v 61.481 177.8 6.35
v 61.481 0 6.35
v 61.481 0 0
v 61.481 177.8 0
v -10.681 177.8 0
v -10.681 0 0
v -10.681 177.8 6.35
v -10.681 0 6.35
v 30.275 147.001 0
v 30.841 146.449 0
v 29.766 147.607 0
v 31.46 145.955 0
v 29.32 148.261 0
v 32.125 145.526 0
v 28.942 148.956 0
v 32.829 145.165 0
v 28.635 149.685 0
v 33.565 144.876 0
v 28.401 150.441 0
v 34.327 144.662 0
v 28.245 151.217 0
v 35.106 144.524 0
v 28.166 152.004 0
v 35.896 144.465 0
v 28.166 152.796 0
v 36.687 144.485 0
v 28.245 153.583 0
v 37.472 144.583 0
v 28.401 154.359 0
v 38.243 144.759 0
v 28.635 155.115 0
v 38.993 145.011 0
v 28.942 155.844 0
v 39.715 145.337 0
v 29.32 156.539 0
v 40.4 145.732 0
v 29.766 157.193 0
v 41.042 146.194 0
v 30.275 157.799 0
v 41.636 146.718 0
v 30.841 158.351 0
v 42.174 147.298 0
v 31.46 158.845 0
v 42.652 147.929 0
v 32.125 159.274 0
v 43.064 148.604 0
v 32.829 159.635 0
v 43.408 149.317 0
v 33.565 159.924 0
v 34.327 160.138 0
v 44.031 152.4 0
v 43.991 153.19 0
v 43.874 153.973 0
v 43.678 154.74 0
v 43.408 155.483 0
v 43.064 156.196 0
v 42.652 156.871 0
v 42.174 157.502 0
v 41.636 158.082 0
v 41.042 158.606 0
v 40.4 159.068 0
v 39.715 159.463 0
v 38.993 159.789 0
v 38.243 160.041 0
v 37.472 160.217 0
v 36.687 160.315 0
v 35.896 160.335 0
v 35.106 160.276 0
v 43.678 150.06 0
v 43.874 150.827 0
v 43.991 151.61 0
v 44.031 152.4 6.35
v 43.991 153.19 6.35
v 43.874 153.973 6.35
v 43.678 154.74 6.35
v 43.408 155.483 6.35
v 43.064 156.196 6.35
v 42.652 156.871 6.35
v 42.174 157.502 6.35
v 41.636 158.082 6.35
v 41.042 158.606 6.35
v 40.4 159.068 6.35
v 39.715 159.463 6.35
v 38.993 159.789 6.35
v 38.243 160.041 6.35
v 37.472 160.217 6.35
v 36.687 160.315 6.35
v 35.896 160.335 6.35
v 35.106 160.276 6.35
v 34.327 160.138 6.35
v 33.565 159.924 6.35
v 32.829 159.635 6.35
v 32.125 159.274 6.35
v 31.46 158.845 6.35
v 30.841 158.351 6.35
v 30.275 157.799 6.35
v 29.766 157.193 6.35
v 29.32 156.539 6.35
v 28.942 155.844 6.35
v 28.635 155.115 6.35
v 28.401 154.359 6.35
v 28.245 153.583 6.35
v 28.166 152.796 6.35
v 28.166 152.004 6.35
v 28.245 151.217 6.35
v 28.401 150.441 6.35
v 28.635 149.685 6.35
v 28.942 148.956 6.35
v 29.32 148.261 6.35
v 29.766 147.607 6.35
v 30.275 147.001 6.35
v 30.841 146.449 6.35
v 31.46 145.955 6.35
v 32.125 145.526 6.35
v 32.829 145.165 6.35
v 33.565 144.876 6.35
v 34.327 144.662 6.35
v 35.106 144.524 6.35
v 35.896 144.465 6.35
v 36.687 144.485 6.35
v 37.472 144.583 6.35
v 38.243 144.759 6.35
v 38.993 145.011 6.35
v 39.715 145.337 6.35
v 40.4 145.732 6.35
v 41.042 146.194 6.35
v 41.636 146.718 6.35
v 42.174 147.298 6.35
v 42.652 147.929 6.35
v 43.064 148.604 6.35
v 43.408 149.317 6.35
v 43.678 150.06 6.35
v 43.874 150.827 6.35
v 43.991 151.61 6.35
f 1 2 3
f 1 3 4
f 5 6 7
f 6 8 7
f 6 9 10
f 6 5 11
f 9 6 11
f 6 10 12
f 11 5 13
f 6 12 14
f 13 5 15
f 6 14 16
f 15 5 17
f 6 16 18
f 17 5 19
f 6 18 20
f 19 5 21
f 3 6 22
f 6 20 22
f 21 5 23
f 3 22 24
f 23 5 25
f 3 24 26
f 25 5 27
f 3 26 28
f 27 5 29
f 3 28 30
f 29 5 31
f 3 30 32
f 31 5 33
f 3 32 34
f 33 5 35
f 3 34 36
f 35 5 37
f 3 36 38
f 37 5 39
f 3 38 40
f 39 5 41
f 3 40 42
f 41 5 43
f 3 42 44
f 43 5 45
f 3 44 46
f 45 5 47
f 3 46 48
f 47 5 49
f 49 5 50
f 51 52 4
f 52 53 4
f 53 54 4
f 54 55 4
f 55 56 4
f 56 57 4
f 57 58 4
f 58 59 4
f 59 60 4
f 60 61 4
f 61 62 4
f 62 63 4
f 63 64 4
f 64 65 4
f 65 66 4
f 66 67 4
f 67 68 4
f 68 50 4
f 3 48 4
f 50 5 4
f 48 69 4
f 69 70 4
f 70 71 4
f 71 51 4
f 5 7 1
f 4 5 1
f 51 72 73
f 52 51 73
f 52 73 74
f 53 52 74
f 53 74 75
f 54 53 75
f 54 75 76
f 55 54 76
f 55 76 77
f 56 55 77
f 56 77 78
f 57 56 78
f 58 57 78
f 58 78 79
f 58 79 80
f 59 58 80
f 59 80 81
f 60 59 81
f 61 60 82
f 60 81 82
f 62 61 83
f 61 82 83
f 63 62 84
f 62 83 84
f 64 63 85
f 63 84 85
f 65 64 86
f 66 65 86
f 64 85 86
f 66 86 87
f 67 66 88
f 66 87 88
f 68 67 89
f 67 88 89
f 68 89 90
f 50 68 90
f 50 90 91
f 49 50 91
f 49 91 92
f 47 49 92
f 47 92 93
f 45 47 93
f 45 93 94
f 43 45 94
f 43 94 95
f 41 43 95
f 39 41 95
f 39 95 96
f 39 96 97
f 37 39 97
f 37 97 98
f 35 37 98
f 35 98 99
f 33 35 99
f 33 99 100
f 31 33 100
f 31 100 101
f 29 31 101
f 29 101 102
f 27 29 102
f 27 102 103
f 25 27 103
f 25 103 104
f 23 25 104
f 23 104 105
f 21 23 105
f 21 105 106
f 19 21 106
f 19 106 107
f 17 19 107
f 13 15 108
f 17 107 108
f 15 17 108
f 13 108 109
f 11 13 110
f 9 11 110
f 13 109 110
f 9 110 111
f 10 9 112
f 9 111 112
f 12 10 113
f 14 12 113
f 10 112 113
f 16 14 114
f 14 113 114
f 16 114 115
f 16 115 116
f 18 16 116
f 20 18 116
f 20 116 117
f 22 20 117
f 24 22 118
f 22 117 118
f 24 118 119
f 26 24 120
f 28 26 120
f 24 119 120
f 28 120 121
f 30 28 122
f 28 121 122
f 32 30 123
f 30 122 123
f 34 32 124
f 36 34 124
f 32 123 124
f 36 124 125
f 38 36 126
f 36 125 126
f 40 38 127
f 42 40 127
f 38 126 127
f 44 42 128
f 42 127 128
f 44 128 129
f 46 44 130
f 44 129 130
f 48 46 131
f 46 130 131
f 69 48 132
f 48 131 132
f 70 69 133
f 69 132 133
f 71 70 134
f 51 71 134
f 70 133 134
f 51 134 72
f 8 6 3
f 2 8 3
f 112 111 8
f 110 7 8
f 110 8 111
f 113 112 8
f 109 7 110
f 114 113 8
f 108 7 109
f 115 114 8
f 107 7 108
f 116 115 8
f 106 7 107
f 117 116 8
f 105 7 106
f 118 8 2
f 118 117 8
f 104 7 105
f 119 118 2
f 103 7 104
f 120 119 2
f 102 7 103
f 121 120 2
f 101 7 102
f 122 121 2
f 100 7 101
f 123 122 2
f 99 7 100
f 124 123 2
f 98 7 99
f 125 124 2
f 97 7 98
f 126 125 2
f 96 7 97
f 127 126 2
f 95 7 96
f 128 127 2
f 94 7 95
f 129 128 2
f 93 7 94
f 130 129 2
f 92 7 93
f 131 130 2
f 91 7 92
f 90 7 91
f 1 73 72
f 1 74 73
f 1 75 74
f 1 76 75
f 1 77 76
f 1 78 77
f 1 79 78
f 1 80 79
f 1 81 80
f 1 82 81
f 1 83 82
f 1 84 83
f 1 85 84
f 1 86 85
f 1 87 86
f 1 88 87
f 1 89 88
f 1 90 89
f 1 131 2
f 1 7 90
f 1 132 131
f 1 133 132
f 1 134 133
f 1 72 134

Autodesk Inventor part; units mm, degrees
ref_plane "YZ Plane" through (0, 0, 0) normal (1, 0, 0) x (0, 1, 0)
ref_plane "XZ Plane" through (0, 0, 0) normal (0, 1, 0) x (-1, 0, 0)
ref_plane "XY Plane" through (0, 0, 0) normal (0, 0, 1) x (1, 0, 0)
sketch "Sketch1" plane through (0, 0, 0) normal (0, 0, 1) x (1, 0, 0)
  line L0 (0, 0) -> (50.8, 0)
  line L1 (50.8, 0) -> (50.8, 190.5)
  line L2 (50.8, 190.5) -> (0, 190.5)
  line L3 (0, 190.5) -> (0, 0)
  dimension "d0" = 50.8
  dimension "d1" = 190.5
extrude "Extrusion1" add sketch "Sketch1" along normal blind 6.35
sketch "Sketch2" plane through (0, 0, 6.35) normal (0, 0, 1) x (1, 0, 0)
  circle A0 centre (36.0934, 152.4) radius 7.9375
  line L0 (0, 0) -> (50.8, 0) projected
  line L1 (50.8, 0) -> (50.8, 190.5) projected
  dimension "d4" = 152.4
  dimension "d5" = 15.875
  dimension "d15" = 14.7066
extrude "Extrusion2" cut sketch "Sketch2" against normal blind 6.35
sketch "Sketch3" plane through (0, 0, 6.35) normal (0, 0, 1) x (1, 0, 0)
  line L0 (0, 190.5) -> (0, 0) projected
  line L1 (50.8, 0) -> (50.8, 190.5) projected
  line L2 (0, 177.8) -> (50.8, 177.8)
  line L3 (50.8, 177.8) -> (50.8, 190.5)
  line L4 (50.8, 190.5) -> (0, 190.5)
  line L5 (0, 190.5) -> (0, 177.8)
  dimension "d8" = 12.7
extrude "Extrusion3" cut sketch "Sketch3" against normal blind 25.4
sketch "Sketch4" plane through (0, 0, 6.35) normal (0, 0, 1) x (1, 0, 0)
  line L0 (0, 0) -> (50.8, 0) projected
  line L1 (0, 0) -> (-10.6807, 0)
  line L2 (-10.6807, 0) -> (-10.6807, 177.8)
  line L3 (-10.6807, 177.8) -> (0, 177.8)
  line L4 (0, 177.8) -> (0, 0)
  line L5 (50.8, 0) -> (61.4807, 0)
  line L6 (61.4807, 0) -> (61.4807, 177.8)
  line L7 (61.4807, 177.8) -> (50.8, 177.8)
  line L8 (50.8, 177.8) -> (50.8, 0)
  dimension "d11" = 10.6807
  dimension "d12" = 10.6807
extrude "Extrusion4" add sketch "Sketch4" against normal blind 6.35
properties part number "polycarb wall for saw blade"
